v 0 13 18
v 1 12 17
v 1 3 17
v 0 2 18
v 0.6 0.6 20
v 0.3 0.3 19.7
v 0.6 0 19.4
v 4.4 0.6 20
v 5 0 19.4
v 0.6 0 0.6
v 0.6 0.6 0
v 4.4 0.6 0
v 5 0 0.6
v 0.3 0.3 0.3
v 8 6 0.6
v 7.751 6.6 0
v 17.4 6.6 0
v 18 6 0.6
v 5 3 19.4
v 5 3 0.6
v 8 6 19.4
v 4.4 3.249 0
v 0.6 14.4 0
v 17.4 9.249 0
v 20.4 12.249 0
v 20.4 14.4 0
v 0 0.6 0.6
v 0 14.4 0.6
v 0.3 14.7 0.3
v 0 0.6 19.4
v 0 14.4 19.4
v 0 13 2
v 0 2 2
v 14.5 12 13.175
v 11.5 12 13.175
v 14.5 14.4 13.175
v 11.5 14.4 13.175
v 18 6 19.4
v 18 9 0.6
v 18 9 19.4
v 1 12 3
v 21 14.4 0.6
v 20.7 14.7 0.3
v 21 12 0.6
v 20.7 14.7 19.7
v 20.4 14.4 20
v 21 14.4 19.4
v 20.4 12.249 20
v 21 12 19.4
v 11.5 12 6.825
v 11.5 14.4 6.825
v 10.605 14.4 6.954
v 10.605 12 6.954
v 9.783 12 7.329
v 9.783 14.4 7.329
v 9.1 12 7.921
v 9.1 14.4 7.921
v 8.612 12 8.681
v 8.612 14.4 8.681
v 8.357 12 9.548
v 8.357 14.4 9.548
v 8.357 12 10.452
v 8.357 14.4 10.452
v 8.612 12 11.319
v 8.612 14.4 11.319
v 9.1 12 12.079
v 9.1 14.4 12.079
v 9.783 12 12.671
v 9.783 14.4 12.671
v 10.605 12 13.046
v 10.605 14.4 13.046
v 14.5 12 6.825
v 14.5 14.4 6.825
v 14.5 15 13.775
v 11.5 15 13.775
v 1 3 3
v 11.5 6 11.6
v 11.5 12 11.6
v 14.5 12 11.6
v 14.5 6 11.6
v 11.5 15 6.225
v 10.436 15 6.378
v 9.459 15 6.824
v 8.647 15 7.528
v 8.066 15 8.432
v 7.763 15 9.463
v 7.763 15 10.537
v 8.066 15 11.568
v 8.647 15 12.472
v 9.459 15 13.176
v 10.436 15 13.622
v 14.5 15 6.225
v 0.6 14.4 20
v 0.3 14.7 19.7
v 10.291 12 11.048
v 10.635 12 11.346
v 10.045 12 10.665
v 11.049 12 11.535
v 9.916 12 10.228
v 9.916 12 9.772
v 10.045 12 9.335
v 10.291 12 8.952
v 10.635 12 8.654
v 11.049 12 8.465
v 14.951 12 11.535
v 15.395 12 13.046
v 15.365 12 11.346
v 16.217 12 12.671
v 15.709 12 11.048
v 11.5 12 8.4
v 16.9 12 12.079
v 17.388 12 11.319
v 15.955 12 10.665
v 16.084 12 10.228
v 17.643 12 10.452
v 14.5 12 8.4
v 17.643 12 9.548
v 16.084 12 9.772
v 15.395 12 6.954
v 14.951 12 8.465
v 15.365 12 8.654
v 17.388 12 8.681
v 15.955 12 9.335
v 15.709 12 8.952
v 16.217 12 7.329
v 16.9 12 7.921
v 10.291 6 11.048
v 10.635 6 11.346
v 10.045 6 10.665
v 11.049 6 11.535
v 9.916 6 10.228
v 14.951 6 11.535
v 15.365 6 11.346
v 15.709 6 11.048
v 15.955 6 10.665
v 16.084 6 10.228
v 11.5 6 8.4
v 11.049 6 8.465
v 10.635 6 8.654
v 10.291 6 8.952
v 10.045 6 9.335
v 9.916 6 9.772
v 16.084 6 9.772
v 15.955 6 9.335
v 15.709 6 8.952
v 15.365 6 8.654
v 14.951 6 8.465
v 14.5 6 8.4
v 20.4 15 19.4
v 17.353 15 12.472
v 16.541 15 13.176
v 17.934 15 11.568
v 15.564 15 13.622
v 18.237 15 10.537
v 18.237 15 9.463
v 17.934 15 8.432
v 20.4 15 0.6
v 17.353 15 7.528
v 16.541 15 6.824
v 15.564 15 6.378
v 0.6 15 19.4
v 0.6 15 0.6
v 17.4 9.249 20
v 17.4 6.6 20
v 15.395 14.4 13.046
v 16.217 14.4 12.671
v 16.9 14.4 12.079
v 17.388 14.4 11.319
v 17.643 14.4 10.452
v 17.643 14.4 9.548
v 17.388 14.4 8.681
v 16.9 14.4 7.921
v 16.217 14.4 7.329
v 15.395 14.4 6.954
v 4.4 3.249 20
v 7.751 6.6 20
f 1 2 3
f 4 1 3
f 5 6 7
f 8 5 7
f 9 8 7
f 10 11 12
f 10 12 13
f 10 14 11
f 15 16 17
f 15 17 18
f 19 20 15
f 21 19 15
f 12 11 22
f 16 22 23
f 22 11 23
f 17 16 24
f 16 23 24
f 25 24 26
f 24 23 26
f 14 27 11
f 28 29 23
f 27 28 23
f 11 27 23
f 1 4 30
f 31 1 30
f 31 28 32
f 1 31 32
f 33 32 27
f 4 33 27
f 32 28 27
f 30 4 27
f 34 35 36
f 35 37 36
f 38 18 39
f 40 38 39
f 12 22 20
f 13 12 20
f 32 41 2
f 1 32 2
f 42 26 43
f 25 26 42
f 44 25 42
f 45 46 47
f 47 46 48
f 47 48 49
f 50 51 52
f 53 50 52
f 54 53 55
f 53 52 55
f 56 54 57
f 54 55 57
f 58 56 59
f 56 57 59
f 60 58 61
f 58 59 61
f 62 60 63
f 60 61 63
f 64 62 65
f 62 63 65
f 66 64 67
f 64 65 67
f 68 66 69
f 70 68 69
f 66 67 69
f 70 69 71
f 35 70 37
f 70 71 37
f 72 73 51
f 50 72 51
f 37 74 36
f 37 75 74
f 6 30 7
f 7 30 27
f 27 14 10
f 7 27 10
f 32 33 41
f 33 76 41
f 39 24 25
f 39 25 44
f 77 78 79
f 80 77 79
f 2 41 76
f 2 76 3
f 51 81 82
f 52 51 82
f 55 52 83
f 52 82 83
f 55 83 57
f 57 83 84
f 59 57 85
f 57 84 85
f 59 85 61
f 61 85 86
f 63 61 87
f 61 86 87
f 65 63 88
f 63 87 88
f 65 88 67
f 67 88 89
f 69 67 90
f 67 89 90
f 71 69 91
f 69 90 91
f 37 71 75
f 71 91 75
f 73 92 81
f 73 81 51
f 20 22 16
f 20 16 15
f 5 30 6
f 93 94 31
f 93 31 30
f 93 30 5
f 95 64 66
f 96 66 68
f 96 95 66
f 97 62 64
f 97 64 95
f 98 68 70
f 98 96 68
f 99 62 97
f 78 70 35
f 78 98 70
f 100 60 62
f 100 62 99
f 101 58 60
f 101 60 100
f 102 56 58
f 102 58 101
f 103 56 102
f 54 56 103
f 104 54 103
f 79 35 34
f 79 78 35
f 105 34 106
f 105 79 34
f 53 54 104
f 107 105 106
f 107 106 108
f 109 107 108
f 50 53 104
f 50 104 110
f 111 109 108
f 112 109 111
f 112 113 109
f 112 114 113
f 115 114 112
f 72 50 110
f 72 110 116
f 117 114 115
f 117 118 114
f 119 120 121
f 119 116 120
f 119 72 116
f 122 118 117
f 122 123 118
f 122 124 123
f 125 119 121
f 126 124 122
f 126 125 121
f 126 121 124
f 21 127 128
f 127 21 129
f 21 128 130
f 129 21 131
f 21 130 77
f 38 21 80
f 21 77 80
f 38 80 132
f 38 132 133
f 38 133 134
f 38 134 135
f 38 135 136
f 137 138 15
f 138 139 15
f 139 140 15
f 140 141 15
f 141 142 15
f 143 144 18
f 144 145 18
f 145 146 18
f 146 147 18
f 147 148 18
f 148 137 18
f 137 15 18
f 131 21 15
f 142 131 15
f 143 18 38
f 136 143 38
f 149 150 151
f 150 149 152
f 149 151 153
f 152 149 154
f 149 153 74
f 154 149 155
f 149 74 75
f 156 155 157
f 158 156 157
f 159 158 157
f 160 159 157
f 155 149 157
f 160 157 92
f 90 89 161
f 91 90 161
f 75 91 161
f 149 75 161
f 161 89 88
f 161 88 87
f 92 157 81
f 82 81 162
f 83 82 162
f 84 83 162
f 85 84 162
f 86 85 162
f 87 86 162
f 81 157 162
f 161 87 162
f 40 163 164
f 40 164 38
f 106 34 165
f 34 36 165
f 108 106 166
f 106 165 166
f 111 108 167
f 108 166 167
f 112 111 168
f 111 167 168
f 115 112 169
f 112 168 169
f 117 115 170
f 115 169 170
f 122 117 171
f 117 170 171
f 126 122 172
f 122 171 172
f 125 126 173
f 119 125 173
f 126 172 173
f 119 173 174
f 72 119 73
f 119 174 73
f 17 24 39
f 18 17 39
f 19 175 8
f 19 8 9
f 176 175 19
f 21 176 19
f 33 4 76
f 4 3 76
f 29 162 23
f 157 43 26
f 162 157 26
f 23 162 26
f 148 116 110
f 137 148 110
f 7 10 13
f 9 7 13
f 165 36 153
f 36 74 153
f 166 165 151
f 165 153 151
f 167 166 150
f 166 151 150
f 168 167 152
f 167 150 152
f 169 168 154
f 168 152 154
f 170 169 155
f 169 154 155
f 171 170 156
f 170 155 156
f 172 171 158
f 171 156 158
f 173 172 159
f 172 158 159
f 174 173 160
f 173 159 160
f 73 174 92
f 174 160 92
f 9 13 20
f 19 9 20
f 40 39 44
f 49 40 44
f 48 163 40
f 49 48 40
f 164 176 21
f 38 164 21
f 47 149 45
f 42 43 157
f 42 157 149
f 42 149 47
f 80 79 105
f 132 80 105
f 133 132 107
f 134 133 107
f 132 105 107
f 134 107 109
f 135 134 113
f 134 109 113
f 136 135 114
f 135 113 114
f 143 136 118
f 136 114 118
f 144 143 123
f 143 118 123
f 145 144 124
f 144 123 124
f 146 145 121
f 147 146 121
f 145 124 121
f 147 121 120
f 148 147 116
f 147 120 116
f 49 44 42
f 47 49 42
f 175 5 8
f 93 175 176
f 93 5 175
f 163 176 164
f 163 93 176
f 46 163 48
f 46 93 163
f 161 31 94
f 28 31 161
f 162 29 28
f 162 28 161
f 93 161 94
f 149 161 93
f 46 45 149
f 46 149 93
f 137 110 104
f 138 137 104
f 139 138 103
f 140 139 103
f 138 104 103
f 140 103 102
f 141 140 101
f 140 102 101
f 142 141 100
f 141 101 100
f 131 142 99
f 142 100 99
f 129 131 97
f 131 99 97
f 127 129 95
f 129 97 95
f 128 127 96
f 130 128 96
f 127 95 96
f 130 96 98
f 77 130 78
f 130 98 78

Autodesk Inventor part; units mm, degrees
ref_plane "YZ Plane" through (0, 0, 0) normal (1, 0, 0) x (0, 1, 0)
ref_plane "XZ Plane" through (0, 0, 0) normal (0, 1, 0) x (-1, 0, 0)
ref_plane "XY Plane" through (0, 0, 0) normal (0, 0, 1) x (1, 0, 0)
sketch "Sketch1" plane through (0, 0, 0) normal (0, 0, 1) x (1, 0, 0)
  line L0 (0, 0) -> (5, 0)
  line L1 (5, 0) -> (5, 3)
  line L2 (5, 3) -> (8, 6)
  line L3 (8, 6) -> (18, 6)
  line L4 (21, 15) -> (0, 15)
  line L5 (0, 15) -> (0, 0)
  line L6 (18, 6) -> (18, 9)
  line L7 (18, 9) -> (21, 12)
  line L8 (21, 12) -> (21, 15)
  dimension "d0" = 45
  dimension "d2" = 5
  dimension "d4" = 10
  dimension "d6" = 3
  dimension "d7" = 3
  dimension "d8" = 3
  dimension "d25" = 3
extrude "Extrusion1" add sketch "Sketch1" along normal blind 20
sketch "Sketch2" plane through (0, 15, 0) normal (0, 1, 0) x (1, 0, 0)
  line L0 (9.9, -10) -> (16.1, -10) construction
  line L1 (11.5, -11.6) -> (14.5, -11.6)
  line L2 (14.5, -8.4) -> (11.5, -8.4)
  arc A0 (11.5, -8.4) -> (11.5, -11.6) centre (11.5, -10) ccw
  arc A1 (14.5, -11.6) -> (14.5, -8.4) centre (14.5, -10) ccw
  line L3 (11.5, -10) -> (14.5, -10) construction
  line L4 (11.5, -13.175) -> (14.5, -13.175)
  line L5 (14.5, -6.825) -> (11.5, -6.825)
  arc A2 (11.5, -6.825) -> (11.5, -13.175) centre (11.5, -10) ccw
  arc A3 (14.5, -13.175) -> (14.5, -6.825) centre (14.5, -10) ccw
  line L6 (8, 0) -> (18, 0) construction
  line L7 (18, 0) -> (18, -20) construction
  line L8 (8, -20) -> (18, -20) construction
  line L9 (8, 0) -> (8, -20) construction
  point P0 (13, -10)
  point P1 (8.325, -10)
  point P2 (13, -20)
  point P3 (8, -10)
  dimension "d11" = 3.2
  dimension "d16" = 6.35
  dimension "d24" = 3
extrude "Extrusion2" cut sketch "Sketch2" against normal through all contours A0 L2 A1 L1
extrude "Extrusion3" cut sketch "Sketch2" against normal blind 3 contours A0 L2 A1 L1 | A2 L5 A3 L4
sketch "Sketch3" plane through (0, 0, 0) normal (-1, 0, 0) x (0, 0, 1)
  line L0 (0, 15) -> (0, 0) construction
  line L1 (0, 0) -> (20, 0) construction
  line L2 (20, 15) -> (20, 0) construction
  line L3 (0, 15) -> (20, 15) construction
  line L4 (17, 12) -> (17, 3)
  line L5 (17, 3) -> (3, 3)
  line L6 (3, 3) -> (3, 12)
  line L7 (3, 12) -> (17, 12)
  dimension "d26" = 3
extrude "Extrusion4" cut sketch "Sketch3" against normal blind 1
chamfer "Chamfer1" distance 0.6 angle 45 25 edges at (10.5, 15, 20) (10.5, 15, 0) (0, 15, 10) (0, 7.5, 20) (0, 7.5, 0) (0, 0, 10) (2.5, 0, 20) (2.5, 0, 0) (19.5, 10.5, 20) (18, 7.5, 20) (13, 6, 20) (6.5, 4.5, 20) (5, 1.5, 20) (5, 1.5, 0) (6.5, 4.5, 0) (13, 6, 0) (18, 7.5, 0) (19.5, 10.5, 0) (17.675, 15, 10) (13, 15, 13.175) (8.325, 15, 10) (13, 15, 6.825) (21, 13.5, 20) (21, 13.5, 0) (21, 15, 10)
chamfer "Chamfer2" distance 1 angle 45 4 edges at (0, 7.5, 3) (0, 12, 10) (0, 7.5, 17) (0, 3, 10)
equation "\"d7\" = d6"
equation "\"d8\" = d7"
equation "\"d25\" = d7"
